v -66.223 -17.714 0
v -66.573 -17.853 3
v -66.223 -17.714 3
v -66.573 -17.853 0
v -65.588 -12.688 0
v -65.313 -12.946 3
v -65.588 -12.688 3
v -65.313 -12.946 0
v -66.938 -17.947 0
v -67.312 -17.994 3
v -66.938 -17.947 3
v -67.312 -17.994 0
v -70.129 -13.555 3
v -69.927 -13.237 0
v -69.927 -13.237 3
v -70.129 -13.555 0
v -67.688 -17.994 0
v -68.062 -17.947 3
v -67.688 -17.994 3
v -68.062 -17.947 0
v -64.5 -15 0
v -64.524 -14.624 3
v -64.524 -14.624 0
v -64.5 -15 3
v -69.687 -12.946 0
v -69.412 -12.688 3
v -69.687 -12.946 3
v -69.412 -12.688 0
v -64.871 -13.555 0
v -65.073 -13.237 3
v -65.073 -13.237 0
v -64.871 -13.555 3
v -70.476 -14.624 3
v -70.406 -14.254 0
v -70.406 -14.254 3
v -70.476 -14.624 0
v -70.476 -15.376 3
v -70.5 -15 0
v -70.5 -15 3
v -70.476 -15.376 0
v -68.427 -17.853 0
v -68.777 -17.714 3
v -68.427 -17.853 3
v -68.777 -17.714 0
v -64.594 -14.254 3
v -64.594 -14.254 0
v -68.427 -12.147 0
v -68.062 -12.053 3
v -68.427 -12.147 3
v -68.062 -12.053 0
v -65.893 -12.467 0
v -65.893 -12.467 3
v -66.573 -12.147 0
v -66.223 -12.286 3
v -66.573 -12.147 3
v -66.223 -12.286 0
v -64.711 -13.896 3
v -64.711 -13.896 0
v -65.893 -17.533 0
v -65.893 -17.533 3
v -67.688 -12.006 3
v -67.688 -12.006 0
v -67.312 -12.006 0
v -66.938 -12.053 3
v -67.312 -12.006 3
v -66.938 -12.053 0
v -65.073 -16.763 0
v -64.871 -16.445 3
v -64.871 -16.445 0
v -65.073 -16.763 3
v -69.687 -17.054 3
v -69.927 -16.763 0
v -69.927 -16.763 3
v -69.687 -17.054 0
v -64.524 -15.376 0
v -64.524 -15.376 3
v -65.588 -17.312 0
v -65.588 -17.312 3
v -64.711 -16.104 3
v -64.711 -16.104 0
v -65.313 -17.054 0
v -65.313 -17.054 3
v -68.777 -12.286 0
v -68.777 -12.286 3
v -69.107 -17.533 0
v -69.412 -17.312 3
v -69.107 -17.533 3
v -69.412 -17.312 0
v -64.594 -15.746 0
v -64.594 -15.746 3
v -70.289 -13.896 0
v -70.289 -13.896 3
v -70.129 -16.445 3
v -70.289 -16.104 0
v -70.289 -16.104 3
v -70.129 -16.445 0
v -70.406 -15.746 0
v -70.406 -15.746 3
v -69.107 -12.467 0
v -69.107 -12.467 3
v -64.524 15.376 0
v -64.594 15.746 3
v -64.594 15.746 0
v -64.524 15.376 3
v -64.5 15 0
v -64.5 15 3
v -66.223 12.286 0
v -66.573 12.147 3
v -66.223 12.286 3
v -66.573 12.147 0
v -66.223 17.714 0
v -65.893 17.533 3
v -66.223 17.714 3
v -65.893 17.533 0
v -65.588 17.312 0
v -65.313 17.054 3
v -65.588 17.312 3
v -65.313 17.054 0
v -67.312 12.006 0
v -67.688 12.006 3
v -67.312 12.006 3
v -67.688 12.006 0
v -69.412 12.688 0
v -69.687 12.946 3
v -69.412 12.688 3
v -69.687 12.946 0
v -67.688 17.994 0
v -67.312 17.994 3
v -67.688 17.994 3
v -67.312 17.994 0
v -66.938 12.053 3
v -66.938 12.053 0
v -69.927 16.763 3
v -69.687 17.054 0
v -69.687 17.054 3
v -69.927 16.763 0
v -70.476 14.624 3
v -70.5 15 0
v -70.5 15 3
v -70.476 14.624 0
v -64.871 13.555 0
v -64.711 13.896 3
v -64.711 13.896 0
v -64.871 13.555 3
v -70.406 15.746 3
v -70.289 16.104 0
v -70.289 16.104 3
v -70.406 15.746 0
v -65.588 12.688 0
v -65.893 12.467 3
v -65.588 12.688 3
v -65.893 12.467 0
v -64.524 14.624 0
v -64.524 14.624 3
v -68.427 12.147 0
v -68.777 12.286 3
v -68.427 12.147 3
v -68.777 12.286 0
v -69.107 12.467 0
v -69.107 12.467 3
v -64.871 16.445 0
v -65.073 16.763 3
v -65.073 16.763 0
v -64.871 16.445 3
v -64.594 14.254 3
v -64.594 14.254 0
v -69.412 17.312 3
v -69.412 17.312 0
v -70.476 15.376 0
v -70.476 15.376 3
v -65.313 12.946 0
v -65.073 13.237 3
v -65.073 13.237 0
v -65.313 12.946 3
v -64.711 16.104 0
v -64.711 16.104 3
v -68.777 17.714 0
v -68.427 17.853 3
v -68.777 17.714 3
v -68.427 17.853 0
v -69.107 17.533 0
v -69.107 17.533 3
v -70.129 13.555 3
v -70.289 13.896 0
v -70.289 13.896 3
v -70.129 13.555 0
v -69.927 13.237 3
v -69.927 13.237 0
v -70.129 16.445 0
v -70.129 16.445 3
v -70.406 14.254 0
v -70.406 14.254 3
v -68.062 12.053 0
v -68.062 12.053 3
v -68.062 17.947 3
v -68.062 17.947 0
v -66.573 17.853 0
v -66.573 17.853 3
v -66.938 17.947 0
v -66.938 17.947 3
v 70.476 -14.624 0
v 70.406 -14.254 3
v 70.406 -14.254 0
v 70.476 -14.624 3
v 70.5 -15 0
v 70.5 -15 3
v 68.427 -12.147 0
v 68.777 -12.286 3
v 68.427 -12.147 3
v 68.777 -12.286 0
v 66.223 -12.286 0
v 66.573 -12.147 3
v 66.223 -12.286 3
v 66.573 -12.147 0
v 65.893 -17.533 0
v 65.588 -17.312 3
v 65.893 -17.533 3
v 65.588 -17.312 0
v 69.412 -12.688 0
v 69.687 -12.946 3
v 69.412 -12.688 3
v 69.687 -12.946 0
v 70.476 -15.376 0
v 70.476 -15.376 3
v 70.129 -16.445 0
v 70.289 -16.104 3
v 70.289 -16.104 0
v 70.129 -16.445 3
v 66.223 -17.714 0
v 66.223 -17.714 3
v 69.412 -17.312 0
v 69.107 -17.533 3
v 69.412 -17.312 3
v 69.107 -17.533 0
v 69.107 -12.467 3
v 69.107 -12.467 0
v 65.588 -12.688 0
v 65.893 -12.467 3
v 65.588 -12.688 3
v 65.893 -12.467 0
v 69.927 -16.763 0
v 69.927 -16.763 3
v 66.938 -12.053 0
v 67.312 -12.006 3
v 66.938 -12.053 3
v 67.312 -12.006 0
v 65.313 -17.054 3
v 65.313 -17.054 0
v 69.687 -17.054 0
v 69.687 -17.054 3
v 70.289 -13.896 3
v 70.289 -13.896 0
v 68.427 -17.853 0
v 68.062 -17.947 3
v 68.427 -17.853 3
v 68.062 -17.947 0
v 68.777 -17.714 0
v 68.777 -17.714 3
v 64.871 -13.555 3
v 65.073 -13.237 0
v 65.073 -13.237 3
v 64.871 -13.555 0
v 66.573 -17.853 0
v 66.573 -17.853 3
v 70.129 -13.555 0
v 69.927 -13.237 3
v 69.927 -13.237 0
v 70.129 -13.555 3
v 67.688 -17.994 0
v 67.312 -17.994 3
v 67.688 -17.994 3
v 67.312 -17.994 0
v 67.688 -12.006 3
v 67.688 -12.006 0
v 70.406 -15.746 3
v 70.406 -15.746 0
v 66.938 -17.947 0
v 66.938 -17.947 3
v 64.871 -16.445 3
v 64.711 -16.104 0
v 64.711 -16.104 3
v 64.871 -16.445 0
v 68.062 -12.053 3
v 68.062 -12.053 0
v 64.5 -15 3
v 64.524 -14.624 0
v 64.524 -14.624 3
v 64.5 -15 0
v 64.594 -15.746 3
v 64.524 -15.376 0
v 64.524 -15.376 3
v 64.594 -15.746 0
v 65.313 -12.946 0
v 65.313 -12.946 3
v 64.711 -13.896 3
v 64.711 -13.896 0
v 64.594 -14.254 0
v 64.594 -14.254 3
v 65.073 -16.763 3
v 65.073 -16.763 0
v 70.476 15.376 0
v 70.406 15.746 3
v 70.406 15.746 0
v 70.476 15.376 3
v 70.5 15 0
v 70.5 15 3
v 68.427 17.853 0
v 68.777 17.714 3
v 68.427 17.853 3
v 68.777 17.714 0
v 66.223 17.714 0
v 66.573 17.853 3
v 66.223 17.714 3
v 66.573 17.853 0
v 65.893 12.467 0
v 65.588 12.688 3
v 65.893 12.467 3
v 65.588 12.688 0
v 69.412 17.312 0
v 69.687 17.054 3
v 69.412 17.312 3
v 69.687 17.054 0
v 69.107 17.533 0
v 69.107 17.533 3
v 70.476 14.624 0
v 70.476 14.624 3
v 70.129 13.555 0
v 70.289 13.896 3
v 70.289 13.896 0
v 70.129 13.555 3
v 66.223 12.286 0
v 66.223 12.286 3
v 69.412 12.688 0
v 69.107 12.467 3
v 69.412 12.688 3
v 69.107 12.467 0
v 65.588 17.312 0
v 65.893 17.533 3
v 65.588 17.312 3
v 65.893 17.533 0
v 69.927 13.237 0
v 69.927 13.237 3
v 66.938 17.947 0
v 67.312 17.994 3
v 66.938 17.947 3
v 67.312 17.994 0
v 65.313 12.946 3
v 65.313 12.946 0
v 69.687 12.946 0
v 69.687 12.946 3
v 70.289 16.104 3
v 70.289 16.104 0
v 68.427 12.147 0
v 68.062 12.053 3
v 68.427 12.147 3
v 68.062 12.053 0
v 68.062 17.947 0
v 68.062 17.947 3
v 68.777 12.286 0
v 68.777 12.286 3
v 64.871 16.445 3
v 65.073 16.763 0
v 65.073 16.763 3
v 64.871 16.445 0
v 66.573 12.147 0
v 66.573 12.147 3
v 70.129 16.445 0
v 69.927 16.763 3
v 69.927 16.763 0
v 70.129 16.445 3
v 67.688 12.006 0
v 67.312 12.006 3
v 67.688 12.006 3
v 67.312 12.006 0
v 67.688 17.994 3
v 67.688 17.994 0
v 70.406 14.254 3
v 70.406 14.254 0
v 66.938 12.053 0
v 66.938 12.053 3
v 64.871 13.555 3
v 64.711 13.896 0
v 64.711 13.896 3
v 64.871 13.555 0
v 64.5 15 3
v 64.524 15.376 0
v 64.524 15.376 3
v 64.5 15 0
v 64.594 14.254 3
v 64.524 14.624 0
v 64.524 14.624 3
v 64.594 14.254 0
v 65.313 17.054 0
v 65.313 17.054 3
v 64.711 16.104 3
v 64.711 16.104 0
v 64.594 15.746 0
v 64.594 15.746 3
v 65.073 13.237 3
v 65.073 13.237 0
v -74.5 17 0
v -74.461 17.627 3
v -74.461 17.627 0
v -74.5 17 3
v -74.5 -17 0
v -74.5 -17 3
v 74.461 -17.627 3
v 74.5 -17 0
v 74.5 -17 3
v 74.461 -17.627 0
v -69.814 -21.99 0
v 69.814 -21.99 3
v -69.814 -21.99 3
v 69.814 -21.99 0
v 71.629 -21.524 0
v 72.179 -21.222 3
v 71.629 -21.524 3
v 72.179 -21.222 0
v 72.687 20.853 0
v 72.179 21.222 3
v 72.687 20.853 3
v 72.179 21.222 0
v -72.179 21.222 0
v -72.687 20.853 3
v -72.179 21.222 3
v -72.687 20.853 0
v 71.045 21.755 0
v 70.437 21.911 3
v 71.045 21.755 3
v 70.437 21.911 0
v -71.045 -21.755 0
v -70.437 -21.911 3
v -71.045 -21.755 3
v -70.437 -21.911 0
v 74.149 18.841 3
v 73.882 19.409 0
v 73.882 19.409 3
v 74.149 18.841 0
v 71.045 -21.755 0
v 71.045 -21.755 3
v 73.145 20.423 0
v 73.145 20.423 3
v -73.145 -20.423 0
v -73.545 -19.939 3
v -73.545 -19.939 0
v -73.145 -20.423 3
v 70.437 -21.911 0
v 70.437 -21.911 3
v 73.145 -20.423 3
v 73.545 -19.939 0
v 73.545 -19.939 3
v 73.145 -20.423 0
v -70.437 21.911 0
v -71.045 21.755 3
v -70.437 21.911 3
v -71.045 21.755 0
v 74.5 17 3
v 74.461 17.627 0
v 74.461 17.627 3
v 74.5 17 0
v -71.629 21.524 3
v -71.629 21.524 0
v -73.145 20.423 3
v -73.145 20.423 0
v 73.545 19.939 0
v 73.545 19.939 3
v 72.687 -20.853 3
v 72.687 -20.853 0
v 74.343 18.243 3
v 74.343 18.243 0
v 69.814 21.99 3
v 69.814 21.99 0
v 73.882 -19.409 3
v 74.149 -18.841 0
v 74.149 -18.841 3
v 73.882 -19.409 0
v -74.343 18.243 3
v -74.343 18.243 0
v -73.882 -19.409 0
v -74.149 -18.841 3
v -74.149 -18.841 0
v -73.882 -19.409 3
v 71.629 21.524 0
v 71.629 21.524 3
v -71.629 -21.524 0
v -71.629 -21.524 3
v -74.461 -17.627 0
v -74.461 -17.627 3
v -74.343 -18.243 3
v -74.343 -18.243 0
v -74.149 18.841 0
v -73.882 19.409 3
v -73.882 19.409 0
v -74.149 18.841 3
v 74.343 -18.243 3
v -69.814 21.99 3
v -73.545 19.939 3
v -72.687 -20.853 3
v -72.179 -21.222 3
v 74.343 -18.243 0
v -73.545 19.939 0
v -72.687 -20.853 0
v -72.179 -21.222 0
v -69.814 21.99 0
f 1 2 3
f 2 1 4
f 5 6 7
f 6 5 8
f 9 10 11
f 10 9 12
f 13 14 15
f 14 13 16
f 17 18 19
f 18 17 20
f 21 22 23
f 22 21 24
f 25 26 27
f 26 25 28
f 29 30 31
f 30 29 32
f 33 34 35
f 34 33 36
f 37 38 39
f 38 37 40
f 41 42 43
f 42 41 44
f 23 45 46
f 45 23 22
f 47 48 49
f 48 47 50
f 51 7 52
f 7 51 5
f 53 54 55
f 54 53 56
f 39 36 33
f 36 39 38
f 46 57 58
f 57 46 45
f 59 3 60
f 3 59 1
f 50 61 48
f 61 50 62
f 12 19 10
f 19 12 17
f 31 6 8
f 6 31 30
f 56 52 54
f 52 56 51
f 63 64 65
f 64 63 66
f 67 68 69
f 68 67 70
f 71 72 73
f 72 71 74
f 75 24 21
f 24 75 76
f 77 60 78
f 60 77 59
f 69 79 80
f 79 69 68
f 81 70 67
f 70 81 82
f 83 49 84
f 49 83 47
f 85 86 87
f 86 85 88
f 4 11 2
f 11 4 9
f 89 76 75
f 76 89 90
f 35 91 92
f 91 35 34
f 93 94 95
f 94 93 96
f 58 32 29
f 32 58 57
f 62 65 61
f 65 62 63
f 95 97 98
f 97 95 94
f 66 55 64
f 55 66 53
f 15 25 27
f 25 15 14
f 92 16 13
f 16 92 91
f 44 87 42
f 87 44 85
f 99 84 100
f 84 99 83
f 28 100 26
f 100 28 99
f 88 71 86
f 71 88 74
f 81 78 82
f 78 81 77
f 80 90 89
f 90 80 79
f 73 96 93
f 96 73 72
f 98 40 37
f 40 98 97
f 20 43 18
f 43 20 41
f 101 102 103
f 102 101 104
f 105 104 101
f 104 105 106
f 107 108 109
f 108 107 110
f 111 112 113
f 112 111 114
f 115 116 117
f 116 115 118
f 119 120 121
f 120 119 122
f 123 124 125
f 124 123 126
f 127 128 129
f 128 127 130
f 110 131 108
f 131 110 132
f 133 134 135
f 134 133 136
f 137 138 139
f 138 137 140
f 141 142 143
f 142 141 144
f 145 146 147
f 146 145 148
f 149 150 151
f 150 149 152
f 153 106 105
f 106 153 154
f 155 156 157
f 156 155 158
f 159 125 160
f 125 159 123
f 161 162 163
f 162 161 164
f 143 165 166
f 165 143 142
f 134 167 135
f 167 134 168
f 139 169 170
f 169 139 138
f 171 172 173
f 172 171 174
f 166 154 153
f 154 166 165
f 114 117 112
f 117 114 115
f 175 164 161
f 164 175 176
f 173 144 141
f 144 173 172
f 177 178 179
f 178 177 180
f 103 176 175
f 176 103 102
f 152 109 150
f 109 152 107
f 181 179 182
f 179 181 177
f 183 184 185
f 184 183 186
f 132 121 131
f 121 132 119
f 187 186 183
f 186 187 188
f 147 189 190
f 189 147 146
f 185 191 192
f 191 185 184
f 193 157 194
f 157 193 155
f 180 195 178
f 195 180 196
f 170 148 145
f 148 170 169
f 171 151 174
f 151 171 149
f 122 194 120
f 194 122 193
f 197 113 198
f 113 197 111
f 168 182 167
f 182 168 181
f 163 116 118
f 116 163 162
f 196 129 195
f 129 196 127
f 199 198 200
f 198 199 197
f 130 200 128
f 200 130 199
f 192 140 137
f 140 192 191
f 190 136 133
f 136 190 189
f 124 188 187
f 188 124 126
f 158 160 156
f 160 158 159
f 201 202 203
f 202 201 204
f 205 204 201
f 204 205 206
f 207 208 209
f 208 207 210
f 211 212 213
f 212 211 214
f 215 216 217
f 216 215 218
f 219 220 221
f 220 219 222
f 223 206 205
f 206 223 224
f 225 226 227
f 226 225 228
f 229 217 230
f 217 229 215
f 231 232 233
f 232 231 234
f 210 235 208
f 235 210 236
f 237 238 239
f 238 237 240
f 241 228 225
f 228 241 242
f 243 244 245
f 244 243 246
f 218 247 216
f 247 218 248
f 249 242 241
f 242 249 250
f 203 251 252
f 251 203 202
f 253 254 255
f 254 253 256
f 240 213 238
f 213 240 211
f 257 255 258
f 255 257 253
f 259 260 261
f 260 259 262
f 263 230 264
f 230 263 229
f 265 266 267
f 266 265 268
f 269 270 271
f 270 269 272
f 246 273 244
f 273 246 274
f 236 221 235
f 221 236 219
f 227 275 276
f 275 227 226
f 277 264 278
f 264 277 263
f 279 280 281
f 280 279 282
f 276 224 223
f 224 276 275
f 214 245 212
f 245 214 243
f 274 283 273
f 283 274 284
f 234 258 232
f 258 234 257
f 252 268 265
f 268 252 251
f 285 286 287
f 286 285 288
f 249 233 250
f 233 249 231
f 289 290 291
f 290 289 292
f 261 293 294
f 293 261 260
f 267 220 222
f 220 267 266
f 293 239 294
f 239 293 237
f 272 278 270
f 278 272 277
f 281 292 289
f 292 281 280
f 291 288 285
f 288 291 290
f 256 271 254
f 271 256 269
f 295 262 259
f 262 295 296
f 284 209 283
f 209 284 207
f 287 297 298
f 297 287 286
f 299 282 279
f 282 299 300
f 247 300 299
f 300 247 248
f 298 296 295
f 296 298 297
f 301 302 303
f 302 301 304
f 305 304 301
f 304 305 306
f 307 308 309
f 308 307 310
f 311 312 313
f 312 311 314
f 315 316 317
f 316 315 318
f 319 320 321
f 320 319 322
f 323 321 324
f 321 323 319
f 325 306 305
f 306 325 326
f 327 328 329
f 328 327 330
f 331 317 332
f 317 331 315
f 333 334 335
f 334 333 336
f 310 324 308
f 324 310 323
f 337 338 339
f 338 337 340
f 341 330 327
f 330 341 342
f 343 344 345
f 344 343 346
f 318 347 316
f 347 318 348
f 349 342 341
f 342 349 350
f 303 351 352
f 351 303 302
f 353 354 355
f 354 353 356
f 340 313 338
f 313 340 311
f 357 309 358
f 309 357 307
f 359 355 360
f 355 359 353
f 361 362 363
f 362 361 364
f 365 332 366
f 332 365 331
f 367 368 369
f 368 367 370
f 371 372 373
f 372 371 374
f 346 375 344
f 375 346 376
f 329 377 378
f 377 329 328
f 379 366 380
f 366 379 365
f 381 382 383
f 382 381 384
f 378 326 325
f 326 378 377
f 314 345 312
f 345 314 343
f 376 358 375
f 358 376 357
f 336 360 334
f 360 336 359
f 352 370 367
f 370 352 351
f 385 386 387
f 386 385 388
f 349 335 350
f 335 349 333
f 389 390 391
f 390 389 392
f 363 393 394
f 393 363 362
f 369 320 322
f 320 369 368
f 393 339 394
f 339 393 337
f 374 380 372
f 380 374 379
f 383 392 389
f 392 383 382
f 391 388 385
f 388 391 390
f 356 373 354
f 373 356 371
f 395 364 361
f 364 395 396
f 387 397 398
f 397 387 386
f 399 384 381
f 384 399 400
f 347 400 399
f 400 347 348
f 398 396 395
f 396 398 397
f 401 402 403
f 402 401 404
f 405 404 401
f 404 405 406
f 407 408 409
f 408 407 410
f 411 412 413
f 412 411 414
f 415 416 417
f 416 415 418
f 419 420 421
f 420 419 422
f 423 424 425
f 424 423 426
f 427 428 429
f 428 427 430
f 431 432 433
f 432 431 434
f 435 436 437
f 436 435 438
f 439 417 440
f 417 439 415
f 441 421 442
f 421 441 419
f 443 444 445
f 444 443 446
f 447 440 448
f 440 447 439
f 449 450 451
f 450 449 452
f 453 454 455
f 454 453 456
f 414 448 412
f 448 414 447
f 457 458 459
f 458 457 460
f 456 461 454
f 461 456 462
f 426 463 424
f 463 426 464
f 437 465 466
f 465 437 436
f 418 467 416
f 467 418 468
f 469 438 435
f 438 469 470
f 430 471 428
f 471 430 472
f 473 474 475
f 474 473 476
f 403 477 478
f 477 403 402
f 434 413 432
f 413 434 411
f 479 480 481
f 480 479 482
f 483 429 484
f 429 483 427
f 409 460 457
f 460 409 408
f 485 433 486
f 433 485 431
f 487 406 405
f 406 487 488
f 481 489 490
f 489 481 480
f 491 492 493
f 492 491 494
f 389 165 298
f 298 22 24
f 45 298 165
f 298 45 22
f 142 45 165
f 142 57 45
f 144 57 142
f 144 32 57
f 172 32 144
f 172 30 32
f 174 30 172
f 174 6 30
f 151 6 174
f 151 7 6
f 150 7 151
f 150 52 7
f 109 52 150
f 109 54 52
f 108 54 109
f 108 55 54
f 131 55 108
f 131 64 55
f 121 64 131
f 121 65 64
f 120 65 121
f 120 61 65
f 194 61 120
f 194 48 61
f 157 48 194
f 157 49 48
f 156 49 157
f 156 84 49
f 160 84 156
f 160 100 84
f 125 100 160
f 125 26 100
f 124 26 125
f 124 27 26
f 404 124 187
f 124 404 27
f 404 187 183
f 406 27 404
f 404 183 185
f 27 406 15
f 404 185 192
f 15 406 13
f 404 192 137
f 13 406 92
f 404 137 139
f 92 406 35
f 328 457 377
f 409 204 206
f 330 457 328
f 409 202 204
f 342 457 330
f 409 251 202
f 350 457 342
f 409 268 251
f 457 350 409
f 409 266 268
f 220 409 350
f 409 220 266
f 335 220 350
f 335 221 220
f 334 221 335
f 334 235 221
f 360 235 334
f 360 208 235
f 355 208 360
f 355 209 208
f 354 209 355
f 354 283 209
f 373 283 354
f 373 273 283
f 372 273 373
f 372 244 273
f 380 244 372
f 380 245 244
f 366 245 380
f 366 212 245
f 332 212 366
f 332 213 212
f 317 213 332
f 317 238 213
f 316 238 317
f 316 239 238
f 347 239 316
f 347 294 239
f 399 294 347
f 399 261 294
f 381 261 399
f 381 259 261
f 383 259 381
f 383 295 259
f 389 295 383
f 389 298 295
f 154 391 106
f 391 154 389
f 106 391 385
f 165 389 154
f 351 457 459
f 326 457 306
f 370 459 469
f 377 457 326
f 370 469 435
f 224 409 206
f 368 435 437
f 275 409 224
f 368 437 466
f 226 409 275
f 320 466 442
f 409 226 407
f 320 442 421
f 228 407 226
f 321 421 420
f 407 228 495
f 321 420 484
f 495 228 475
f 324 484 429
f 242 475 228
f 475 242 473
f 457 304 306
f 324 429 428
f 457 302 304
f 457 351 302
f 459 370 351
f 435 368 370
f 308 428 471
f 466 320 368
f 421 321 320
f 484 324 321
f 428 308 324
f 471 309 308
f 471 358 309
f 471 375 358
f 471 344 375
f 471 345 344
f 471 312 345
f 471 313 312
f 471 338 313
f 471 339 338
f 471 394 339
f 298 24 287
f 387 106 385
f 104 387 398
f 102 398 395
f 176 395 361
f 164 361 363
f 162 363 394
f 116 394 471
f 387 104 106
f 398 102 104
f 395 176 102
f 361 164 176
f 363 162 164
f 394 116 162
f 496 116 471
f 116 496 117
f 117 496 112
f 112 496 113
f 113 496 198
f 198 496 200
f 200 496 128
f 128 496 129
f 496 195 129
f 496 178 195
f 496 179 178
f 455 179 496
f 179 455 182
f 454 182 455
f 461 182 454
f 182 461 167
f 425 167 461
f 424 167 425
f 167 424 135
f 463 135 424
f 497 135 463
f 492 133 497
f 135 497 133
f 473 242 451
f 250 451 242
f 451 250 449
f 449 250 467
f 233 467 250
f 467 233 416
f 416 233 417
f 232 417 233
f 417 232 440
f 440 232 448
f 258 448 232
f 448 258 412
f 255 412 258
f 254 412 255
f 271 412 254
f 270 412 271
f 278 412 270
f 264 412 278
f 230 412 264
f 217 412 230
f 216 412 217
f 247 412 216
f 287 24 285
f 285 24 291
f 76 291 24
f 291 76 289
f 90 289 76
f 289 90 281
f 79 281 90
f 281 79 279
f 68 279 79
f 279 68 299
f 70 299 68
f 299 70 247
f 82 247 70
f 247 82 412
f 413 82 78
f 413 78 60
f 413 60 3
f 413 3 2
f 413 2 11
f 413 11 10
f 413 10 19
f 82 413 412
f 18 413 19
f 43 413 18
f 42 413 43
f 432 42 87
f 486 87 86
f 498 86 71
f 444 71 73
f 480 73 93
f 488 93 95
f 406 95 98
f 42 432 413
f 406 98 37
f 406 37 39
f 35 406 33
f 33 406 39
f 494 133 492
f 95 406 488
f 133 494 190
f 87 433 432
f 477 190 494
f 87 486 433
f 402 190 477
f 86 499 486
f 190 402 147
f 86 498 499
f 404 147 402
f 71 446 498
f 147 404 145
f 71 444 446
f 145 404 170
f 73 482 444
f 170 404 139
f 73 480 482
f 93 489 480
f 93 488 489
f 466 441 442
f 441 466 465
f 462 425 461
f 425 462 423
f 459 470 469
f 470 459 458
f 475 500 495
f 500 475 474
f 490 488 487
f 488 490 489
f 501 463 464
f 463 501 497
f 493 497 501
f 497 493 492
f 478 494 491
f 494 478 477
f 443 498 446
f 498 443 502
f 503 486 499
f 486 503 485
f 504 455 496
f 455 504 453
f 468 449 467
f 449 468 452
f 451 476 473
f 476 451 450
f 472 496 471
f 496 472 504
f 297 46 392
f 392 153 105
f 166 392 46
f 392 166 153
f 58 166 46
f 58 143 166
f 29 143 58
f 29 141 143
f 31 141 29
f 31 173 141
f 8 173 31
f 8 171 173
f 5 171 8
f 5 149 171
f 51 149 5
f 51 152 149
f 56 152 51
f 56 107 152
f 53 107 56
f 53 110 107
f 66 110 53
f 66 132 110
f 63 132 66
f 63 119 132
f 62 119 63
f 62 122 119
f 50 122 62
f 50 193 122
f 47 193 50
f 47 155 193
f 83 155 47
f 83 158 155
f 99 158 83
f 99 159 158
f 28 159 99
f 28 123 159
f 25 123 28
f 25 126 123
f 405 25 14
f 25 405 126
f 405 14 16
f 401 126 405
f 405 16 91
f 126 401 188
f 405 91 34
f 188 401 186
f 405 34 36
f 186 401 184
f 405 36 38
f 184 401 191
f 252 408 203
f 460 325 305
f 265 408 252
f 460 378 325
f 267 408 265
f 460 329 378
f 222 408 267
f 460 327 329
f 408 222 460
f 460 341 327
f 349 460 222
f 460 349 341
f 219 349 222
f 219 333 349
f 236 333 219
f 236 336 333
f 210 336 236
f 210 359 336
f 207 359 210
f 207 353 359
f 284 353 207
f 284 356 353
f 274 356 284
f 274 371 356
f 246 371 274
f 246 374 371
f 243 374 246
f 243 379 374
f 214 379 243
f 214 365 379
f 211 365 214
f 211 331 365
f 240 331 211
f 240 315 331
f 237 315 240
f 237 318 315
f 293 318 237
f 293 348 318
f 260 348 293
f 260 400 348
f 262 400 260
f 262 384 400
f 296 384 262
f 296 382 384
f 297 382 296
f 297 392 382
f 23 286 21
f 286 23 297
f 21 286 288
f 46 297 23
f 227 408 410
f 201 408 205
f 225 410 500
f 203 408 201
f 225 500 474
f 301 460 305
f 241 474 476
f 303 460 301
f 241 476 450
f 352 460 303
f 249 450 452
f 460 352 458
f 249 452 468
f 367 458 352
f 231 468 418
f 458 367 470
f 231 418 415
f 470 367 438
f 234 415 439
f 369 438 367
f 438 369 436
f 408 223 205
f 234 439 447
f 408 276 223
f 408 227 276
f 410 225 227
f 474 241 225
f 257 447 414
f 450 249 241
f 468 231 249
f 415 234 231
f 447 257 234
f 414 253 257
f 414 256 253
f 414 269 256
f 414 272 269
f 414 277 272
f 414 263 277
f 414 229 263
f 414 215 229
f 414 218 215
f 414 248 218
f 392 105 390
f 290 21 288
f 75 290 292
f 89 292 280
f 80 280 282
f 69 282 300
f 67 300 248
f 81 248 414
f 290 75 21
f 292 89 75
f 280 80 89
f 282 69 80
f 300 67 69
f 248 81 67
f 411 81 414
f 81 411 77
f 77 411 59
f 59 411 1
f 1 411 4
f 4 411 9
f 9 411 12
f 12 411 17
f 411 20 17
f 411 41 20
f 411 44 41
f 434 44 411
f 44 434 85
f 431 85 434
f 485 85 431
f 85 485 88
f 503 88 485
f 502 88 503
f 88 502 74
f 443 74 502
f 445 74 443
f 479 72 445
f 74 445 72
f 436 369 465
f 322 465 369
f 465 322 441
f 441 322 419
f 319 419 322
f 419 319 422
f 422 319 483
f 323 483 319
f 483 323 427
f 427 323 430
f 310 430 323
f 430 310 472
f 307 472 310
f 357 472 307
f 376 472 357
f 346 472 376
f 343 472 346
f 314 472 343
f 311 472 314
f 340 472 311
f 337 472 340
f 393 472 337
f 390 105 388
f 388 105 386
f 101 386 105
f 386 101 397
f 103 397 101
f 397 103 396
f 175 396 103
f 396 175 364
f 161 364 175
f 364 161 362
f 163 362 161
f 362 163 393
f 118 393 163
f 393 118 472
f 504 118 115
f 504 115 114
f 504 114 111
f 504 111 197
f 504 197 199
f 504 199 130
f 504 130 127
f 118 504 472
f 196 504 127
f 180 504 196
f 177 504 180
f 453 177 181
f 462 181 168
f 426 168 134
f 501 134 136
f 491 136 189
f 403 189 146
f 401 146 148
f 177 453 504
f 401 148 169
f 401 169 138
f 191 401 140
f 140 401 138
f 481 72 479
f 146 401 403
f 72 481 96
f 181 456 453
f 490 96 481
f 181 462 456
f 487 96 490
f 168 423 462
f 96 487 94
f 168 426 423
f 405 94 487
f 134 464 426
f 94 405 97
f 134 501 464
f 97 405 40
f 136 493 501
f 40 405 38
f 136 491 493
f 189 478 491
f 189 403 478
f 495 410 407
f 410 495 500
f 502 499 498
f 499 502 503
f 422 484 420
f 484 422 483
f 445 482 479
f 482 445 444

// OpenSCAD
$fn = 50;


difference() {
	union() {
		hull() {
			translate(v = [-69.5000000000, 17.0000000000, 0]) {
				cylinder(h = 3, r = 5);
			}
			translate(v = [69.5000000000, 17.0000000000, 0]) {
				cylinder(h = 3, r = 5);
			}
			translate(v = [-69.5000000000, -17.0000000000, 0]) {
				cylinder(h = 3, r = 5);
			}
			translate(v = [69.5000000000, -17.0000000000, 0]) {
				cylinder(h = 3, r = 5);
			}
		}
	}
	union() {
		translate(v = [-67.5000000000, -15.0000000000, -100.0000000000]) {
			cylinder(h = 200, r = 3.0000000000);
		}
		translate(v = [-67.5000000000, 15.0000000000, -100.0000000000]) {
			cylinder(h = 200, r = 3.0000000000);
		}
		translate(v = [67.5000000000, -15.0000000000, -100.0000000000]) {
			cylinder(h = 200, r = 3.0000000000);
		}
		translate(v = [67.5000000000, 15.0000000000, -100.0000000000]) {
			cylinder(h = 200, r = 3.0000000000);
		}
	}
}
